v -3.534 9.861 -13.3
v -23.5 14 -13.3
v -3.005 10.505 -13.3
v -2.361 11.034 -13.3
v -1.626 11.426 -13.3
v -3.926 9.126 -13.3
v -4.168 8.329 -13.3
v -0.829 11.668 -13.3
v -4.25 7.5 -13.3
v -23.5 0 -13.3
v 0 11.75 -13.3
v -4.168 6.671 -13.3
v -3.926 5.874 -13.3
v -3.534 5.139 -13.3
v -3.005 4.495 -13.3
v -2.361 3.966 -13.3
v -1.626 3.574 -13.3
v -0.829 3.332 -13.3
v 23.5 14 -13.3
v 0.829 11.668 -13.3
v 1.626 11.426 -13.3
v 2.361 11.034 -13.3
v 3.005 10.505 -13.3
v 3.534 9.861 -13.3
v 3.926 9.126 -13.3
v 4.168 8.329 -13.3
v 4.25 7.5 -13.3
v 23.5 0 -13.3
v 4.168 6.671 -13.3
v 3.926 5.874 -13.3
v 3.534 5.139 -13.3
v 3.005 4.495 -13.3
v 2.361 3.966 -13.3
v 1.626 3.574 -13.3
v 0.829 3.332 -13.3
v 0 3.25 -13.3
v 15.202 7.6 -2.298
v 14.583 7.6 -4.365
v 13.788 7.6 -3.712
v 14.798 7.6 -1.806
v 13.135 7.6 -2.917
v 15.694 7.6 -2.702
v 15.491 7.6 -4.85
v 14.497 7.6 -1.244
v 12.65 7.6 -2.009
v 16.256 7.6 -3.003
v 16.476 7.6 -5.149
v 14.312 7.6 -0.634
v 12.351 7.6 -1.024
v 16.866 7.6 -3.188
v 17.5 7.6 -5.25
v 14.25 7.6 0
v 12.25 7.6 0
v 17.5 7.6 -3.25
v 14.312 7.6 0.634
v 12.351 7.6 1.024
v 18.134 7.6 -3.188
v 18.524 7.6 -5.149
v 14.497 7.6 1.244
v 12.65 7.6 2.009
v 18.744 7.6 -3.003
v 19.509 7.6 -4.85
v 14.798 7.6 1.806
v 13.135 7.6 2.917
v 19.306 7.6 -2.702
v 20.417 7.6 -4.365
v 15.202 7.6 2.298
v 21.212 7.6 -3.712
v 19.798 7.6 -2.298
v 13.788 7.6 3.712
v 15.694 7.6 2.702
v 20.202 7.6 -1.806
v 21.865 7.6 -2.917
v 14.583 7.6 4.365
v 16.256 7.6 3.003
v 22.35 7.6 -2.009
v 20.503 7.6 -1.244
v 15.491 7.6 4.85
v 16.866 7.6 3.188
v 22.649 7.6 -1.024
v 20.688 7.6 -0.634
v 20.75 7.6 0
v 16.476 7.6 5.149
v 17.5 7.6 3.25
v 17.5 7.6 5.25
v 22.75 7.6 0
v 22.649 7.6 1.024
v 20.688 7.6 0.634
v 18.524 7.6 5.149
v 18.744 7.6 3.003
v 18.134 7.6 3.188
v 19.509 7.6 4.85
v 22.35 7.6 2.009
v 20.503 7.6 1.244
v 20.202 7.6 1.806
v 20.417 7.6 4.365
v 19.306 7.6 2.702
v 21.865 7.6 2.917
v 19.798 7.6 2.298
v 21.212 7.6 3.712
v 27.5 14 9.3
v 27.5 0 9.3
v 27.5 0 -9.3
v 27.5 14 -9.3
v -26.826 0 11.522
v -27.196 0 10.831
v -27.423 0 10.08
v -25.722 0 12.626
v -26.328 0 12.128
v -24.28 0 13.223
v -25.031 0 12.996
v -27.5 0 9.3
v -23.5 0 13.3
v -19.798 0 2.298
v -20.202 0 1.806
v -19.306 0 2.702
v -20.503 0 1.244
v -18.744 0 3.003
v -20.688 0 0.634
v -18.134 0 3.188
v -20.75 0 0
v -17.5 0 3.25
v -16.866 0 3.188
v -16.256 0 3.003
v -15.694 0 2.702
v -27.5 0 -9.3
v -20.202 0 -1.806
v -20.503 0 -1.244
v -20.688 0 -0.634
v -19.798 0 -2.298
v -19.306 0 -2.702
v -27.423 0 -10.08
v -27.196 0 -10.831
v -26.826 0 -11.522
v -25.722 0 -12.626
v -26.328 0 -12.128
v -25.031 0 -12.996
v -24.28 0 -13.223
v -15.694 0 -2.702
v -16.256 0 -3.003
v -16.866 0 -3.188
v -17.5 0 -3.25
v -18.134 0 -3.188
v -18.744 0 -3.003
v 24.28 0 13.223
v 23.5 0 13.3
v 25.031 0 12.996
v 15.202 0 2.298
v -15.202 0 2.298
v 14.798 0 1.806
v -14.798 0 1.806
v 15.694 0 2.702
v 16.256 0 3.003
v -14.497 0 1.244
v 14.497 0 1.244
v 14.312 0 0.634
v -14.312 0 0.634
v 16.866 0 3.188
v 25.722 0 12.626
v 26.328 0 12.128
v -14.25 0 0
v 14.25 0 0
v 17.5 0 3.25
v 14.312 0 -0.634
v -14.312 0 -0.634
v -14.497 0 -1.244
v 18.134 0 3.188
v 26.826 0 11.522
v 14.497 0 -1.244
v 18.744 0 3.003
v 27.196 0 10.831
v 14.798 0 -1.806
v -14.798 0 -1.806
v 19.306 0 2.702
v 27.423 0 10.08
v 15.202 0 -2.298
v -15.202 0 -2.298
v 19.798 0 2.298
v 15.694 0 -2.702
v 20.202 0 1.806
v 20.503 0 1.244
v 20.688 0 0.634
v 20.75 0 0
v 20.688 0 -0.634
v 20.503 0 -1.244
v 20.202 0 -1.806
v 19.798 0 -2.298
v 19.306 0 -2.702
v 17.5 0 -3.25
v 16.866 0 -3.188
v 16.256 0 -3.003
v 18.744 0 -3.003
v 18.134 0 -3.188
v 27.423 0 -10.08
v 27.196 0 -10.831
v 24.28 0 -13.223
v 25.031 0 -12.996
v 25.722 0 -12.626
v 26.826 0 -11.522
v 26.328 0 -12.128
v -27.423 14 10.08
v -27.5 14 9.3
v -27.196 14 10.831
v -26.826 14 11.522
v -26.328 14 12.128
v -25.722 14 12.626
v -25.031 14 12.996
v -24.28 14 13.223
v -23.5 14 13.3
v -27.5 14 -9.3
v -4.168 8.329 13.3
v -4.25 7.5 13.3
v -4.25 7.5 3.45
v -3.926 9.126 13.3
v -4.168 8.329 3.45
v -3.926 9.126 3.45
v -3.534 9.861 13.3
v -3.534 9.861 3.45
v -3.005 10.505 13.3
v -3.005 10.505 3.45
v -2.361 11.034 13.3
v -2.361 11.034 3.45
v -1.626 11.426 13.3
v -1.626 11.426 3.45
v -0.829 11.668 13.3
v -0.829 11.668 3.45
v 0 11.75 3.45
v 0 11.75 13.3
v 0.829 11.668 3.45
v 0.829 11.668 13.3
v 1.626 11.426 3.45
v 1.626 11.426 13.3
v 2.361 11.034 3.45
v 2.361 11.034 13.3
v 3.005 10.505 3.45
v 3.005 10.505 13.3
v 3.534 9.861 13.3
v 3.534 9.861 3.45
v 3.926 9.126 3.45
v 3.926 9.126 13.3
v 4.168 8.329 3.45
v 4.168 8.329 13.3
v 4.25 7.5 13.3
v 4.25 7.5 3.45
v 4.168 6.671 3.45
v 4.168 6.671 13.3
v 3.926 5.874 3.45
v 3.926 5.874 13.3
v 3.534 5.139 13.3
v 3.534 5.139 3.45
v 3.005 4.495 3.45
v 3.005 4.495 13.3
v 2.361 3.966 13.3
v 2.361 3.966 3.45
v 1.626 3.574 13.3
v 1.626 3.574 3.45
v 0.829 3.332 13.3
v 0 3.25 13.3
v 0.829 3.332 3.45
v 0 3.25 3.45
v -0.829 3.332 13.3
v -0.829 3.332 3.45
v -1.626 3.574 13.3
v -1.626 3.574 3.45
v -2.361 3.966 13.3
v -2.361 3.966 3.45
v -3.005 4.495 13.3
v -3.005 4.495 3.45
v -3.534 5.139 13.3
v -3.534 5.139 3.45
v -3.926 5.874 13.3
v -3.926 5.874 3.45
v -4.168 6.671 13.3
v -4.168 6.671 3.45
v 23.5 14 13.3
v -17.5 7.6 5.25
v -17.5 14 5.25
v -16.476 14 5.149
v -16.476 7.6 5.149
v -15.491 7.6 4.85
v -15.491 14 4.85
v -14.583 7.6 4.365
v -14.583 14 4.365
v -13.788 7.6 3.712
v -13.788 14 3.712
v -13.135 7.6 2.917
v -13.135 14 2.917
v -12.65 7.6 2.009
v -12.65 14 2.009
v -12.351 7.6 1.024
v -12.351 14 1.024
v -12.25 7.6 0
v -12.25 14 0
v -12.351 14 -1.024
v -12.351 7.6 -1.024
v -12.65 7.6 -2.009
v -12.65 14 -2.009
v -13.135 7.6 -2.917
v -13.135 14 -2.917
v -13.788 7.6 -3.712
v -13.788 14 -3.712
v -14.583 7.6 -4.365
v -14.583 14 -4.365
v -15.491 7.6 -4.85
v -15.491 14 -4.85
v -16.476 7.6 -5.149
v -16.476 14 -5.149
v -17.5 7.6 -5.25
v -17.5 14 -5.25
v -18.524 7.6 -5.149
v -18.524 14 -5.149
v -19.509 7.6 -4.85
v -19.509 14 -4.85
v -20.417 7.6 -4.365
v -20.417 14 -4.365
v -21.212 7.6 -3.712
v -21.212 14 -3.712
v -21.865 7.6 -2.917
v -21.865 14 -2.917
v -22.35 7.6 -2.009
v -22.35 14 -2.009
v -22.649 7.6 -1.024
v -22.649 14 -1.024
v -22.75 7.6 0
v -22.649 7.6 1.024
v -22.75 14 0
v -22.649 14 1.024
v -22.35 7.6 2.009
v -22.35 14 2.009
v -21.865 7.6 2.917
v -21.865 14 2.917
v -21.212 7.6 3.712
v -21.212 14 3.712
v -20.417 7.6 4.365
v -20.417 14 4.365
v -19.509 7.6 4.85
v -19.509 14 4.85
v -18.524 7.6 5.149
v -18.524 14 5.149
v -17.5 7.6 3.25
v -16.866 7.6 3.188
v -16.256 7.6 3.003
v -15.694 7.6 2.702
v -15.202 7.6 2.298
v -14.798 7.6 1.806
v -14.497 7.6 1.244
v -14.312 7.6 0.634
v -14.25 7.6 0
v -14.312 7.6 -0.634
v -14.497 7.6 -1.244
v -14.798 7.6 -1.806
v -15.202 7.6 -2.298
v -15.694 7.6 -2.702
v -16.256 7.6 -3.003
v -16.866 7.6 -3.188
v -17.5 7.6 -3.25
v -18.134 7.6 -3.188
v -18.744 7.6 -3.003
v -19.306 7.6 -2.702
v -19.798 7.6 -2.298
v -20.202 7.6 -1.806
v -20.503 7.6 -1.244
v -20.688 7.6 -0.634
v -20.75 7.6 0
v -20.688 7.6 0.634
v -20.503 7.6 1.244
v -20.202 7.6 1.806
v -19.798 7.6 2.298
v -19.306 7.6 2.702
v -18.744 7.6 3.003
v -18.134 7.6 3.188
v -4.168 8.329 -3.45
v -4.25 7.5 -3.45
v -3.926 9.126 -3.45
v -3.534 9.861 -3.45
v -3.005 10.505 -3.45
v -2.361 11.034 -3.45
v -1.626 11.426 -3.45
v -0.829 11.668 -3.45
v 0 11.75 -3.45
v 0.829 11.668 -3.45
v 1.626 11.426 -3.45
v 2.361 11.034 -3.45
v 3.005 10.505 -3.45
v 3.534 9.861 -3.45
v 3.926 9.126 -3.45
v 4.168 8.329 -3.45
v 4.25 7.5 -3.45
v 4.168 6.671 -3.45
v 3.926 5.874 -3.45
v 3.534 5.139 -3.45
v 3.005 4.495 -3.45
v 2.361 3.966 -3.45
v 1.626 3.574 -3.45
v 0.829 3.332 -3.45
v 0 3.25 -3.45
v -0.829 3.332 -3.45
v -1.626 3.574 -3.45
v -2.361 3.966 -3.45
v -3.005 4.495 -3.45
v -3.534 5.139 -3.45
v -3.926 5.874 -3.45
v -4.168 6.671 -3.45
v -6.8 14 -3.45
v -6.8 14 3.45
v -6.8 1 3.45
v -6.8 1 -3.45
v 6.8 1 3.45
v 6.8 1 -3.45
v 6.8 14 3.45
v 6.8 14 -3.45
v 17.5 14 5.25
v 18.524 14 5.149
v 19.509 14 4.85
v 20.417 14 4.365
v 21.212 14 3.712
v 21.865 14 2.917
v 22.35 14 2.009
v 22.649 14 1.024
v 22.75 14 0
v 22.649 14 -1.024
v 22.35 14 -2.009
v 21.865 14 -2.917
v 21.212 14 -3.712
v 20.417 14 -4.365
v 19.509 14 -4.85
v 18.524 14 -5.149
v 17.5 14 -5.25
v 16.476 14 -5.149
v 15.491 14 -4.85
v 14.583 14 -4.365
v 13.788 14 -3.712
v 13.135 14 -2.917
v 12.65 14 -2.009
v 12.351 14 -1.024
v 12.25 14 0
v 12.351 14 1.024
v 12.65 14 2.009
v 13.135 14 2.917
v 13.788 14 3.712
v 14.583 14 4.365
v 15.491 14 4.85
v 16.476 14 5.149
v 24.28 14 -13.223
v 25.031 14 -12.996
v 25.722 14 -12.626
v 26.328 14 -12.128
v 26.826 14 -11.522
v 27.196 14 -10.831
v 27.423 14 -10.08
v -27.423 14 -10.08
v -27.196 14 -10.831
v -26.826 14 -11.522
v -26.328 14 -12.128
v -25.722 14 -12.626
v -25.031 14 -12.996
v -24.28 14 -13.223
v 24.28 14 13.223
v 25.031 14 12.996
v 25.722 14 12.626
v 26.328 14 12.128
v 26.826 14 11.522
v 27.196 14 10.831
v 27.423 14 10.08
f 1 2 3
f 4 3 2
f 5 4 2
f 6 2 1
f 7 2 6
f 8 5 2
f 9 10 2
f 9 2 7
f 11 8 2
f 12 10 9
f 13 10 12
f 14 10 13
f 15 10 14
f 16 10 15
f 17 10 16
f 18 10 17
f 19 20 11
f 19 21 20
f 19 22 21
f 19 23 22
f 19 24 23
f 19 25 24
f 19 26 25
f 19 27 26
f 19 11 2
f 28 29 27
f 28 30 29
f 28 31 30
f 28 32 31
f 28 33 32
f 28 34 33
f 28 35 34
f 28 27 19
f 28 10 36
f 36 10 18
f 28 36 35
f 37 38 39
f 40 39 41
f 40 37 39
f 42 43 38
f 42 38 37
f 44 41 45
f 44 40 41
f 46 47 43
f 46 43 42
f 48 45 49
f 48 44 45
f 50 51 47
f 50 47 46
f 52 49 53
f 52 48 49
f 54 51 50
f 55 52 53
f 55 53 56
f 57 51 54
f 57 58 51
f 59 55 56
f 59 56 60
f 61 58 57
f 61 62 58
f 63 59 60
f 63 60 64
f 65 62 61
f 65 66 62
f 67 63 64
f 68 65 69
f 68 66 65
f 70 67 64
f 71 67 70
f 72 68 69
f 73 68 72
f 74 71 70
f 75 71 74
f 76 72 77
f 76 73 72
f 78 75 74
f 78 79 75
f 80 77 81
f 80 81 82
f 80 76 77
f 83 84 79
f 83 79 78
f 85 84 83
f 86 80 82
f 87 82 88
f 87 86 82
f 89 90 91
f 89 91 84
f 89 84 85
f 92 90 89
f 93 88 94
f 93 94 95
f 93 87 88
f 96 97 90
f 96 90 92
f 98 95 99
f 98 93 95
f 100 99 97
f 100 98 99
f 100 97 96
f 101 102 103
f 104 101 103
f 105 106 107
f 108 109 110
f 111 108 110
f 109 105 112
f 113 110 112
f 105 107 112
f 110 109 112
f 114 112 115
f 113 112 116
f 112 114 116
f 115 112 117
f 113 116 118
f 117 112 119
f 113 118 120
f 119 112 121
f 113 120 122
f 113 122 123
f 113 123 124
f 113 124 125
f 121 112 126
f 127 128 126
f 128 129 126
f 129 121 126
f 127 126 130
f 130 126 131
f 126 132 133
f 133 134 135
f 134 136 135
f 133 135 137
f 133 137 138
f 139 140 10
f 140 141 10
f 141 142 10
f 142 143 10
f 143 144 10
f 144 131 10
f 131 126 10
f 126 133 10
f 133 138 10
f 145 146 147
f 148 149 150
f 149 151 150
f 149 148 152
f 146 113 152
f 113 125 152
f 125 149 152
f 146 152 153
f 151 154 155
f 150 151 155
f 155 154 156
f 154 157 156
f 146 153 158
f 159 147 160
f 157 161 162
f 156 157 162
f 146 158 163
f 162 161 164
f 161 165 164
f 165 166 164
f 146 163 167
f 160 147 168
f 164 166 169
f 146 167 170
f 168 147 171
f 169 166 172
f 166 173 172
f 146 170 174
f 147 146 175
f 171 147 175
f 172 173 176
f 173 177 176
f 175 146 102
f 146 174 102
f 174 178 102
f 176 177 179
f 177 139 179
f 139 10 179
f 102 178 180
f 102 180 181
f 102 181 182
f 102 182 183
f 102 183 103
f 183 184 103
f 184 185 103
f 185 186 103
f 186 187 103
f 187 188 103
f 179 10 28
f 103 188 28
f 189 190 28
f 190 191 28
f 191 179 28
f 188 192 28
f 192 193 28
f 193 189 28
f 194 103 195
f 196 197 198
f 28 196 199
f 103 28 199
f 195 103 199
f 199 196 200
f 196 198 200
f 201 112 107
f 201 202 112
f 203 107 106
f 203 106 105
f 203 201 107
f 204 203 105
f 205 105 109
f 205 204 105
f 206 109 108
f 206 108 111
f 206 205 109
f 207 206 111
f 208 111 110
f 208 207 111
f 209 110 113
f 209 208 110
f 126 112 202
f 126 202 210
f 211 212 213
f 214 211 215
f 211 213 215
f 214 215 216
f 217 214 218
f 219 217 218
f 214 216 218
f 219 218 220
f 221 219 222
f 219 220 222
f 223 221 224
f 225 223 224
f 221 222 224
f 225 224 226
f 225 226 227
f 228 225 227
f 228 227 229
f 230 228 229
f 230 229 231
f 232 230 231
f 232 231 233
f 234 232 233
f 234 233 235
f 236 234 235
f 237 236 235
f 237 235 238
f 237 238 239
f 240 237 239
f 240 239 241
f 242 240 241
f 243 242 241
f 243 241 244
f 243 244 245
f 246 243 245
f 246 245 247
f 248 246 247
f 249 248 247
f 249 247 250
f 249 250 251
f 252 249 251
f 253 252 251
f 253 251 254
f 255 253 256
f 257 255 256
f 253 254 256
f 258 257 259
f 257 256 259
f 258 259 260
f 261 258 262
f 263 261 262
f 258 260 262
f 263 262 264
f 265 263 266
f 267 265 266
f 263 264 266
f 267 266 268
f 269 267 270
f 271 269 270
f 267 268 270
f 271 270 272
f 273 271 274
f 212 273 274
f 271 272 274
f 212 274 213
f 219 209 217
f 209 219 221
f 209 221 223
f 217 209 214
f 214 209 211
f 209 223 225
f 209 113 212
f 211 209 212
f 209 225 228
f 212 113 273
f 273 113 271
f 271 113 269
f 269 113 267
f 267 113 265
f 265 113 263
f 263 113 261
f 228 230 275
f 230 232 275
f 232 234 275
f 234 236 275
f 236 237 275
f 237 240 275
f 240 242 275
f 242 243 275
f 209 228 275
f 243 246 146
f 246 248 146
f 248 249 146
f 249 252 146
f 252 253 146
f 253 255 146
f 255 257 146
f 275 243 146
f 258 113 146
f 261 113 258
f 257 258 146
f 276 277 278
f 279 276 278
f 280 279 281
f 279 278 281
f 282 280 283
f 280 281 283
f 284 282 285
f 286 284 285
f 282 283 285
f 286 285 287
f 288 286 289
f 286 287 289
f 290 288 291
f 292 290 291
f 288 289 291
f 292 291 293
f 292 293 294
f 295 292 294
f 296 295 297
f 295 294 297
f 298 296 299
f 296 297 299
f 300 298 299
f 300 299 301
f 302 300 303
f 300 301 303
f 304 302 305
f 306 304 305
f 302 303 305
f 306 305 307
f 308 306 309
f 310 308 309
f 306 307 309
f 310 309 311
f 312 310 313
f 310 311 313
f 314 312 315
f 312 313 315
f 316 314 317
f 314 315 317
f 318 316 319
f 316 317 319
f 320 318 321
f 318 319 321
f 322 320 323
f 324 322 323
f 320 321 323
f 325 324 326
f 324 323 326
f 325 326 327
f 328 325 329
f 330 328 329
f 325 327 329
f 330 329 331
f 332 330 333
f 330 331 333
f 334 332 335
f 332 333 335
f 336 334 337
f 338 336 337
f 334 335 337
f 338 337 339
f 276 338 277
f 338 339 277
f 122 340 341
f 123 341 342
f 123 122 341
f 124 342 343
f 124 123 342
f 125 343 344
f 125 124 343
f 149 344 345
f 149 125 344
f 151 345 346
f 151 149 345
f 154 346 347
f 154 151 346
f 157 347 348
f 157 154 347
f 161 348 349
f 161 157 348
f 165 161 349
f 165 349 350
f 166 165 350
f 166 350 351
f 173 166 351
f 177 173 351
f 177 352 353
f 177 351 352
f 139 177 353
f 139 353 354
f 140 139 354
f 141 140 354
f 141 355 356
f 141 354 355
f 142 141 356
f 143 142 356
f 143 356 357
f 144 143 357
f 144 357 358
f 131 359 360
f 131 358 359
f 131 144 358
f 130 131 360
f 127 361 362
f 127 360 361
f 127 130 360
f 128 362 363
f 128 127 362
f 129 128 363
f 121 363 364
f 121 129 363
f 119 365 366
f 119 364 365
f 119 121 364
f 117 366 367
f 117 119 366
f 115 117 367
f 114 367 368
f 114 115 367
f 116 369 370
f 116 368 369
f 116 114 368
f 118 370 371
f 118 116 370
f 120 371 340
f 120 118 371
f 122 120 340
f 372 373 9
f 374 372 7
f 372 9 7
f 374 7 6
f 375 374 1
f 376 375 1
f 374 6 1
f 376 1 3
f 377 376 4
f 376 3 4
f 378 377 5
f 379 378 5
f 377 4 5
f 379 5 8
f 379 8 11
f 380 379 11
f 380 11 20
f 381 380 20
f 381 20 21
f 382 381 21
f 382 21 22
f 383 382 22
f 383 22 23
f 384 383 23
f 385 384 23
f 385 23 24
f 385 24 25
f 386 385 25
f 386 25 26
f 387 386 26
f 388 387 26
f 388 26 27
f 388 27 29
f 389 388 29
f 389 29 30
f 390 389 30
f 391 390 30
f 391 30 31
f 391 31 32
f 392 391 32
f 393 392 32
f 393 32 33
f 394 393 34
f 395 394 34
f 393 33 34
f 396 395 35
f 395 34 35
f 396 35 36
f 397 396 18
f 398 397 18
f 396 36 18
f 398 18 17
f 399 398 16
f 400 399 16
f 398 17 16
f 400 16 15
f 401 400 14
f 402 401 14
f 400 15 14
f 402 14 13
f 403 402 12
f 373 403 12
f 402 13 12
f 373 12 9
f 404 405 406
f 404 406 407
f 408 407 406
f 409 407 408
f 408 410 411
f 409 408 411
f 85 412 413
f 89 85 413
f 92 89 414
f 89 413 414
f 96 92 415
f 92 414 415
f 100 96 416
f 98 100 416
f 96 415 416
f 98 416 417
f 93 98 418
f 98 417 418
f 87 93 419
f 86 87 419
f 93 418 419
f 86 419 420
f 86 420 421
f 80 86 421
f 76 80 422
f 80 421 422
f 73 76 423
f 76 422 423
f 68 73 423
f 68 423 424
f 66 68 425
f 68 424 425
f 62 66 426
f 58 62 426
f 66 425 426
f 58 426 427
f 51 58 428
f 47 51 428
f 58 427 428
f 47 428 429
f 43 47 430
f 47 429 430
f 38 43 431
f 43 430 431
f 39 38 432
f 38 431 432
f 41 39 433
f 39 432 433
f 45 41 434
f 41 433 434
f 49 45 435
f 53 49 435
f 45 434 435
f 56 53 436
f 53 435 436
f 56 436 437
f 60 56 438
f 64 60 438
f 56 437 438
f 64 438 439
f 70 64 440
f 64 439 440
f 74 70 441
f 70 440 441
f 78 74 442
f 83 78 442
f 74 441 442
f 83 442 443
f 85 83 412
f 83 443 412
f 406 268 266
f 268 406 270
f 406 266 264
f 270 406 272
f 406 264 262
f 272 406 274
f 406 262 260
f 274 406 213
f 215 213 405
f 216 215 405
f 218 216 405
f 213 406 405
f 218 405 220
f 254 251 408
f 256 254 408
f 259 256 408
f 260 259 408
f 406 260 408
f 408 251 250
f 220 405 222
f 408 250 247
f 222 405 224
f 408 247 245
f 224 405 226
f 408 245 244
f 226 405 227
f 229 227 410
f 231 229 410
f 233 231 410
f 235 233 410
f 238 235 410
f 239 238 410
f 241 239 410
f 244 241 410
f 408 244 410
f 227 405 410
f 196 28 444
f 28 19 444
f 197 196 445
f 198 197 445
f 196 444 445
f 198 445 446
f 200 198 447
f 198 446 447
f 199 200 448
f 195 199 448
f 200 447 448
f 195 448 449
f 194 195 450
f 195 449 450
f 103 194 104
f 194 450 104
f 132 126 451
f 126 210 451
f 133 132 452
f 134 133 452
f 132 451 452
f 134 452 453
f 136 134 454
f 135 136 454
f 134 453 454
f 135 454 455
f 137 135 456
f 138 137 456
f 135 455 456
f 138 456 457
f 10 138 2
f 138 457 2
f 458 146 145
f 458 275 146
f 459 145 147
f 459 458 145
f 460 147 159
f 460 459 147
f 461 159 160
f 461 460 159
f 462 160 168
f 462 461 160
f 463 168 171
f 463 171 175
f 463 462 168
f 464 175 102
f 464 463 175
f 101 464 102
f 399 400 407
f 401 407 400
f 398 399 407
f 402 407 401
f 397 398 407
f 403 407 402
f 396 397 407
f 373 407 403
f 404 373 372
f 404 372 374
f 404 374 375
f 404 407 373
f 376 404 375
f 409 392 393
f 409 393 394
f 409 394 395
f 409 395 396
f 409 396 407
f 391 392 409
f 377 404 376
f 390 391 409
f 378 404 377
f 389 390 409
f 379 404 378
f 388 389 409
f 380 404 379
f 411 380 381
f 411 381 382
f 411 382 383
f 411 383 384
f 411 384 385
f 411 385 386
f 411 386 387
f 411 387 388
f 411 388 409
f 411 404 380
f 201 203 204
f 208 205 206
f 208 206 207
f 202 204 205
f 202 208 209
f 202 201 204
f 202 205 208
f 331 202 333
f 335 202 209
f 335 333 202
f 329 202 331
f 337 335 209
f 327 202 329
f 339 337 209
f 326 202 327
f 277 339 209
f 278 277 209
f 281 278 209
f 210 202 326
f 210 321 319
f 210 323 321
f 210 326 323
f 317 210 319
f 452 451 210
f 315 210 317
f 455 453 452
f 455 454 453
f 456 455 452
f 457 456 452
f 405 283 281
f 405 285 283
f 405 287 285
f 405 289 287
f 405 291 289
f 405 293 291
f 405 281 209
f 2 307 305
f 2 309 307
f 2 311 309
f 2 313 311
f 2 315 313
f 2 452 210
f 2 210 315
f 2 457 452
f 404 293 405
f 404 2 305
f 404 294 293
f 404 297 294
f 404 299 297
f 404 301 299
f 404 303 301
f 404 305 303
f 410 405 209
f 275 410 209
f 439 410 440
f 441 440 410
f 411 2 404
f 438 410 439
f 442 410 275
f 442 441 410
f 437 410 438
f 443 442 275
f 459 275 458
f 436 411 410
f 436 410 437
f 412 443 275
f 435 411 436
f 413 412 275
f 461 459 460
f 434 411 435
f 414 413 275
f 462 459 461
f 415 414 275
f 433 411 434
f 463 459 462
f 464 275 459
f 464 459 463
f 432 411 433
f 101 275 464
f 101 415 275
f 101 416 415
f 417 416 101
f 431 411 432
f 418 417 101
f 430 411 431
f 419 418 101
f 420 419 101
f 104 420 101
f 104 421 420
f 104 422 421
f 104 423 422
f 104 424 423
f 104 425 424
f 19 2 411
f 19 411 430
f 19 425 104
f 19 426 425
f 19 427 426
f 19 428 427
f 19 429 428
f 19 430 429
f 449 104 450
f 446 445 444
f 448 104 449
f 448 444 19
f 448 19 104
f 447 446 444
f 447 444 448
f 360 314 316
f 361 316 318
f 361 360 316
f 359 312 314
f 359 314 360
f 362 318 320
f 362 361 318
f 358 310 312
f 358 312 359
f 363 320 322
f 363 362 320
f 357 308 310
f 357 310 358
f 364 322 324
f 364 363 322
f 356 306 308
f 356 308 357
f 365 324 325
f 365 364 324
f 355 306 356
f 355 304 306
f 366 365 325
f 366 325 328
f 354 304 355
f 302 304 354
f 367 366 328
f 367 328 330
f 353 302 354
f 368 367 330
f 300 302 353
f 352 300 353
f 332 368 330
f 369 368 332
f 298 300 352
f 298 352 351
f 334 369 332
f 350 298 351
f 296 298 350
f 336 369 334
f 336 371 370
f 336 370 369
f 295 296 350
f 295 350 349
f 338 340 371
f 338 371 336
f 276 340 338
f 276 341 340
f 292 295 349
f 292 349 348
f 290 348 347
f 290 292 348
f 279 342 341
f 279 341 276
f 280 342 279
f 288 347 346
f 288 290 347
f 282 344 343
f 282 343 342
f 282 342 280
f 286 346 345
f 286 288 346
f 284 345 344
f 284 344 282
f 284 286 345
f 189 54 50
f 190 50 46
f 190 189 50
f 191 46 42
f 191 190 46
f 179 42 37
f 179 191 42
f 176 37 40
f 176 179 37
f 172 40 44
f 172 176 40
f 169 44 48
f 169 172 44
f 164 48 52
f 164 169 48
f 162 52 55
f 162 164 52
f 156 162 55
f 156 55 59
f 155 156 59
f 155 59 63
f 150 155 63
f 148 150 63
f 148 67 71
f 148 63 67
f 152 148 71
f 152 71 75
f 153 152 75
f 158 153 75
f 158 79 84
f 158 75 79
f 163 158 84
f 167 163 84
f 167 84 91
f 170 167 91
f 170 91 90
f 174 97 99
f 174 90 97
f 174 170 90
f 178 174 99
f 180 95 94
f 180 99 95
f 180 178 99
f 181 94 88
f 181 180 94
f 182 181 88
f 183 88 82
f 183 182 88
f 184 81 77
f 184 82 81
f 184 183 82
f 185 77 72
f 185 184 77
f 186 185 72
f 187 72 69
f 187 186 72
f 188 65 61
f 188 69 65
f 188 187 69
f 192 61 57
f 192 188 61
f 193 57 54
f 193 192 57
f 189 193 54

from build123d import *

# Parameters (mm, degrees)
SKETCH1_W           = 55
SKETCH1_H           = 26.6
SKETCH1_R           = 3.25
BOSS_EXTRUDE1_DEPTH = 14
SKETCH3_W           = 13.6
SKETCH3_H           = 6.9
CUT_EXTRUDE1_DEPTH  = 13
SKETCH4_R           = 4.25
CUT_EXTRUDE2_DEPTH  = 41.740765825
SKETCH5_R           = 5.25
CUT_EXTRUDE3_DEPTH  = 6.4
FILLET1_R           = 4


with BuildPart() as part:
    # Sketch1 → Boss-Extrude1 (new body)
    with BuildSketch(Plane(origin=(0, 0, 0), x_dir=(1, 0, 0), z_dir=(0, 1, 0))):
        Rectangle(SKETCH1_W, SKETCH1_H)
        with Locations(Location((-17.5, 0, 0), (0, 0, 270))):
            Circle(SKETCH1_R, mode=Mode.SUBTRACT)
        with Locations(Location((17.5, 0, 0), (0, 0, 90))):
            Circle(SKETCH1_R, mode=Mode.SUBTRACT)
    extrude(amount=BOSS_EXTRUDE1_DEPTH)

    # Sketch3 → Cut-Extrude1 (cut)
    with BuildSketch(Plane(origin=(0, 14, 0), x_dir=(1, 0, 0), z_dir=(0, 1, 0))):
        Rectangle(SKETCH3_W, SKETCH3_H)
    extrude(amount=-CUT_EXTRUDE1_DEPTH, mode=Mode.SUBTRACT)

    # Sketch4 → Cut-Extrude2 (cut, through all)
    with BuildSketch(Plane(origin=(0, 0, -13.3), x_dir=(-1, 0, 0), z_dir=(0, 0, -1))):
        with Locations((0, 7.5)):
            Circle(SKETCH4_R)
    extrude(amount=-CUT_EXTRUDE2_DEPTH, mode=Mode.SUBTRACT)

    # Sketch5 → Cut-Extrude3 (cut)
    with BuildSketch(Plane(origin=(0, 14, 0), x_dir=(1, 0, 0), z_dir=(0, 1, 0))):
        with Locations(Location((-17.5, 0, 0), (0, 0, 270))):
            Circle(SKETCH5_R)
        with Locations(Location((17.5, 0, 0), (0, 0, 270))):
            Circle(SKETCH5_R)
    extrude(amount=-CUT_EXTRUDE3_DEPTH, mode=Mode.SUBTRACT)

    # Fillet1
    fillet1_edges = [part.edges().sort_by_distance(p)[0] for p in [
        (27.5, 7, 13.3),
        (-27.5, 7, 13.3),
        (-27.5, 7, -13.3),
        (27.5, 7, -13.3),
    ]]
    fillet(fillet1_edges, radius=FILLET1_R)


solid = part.part
